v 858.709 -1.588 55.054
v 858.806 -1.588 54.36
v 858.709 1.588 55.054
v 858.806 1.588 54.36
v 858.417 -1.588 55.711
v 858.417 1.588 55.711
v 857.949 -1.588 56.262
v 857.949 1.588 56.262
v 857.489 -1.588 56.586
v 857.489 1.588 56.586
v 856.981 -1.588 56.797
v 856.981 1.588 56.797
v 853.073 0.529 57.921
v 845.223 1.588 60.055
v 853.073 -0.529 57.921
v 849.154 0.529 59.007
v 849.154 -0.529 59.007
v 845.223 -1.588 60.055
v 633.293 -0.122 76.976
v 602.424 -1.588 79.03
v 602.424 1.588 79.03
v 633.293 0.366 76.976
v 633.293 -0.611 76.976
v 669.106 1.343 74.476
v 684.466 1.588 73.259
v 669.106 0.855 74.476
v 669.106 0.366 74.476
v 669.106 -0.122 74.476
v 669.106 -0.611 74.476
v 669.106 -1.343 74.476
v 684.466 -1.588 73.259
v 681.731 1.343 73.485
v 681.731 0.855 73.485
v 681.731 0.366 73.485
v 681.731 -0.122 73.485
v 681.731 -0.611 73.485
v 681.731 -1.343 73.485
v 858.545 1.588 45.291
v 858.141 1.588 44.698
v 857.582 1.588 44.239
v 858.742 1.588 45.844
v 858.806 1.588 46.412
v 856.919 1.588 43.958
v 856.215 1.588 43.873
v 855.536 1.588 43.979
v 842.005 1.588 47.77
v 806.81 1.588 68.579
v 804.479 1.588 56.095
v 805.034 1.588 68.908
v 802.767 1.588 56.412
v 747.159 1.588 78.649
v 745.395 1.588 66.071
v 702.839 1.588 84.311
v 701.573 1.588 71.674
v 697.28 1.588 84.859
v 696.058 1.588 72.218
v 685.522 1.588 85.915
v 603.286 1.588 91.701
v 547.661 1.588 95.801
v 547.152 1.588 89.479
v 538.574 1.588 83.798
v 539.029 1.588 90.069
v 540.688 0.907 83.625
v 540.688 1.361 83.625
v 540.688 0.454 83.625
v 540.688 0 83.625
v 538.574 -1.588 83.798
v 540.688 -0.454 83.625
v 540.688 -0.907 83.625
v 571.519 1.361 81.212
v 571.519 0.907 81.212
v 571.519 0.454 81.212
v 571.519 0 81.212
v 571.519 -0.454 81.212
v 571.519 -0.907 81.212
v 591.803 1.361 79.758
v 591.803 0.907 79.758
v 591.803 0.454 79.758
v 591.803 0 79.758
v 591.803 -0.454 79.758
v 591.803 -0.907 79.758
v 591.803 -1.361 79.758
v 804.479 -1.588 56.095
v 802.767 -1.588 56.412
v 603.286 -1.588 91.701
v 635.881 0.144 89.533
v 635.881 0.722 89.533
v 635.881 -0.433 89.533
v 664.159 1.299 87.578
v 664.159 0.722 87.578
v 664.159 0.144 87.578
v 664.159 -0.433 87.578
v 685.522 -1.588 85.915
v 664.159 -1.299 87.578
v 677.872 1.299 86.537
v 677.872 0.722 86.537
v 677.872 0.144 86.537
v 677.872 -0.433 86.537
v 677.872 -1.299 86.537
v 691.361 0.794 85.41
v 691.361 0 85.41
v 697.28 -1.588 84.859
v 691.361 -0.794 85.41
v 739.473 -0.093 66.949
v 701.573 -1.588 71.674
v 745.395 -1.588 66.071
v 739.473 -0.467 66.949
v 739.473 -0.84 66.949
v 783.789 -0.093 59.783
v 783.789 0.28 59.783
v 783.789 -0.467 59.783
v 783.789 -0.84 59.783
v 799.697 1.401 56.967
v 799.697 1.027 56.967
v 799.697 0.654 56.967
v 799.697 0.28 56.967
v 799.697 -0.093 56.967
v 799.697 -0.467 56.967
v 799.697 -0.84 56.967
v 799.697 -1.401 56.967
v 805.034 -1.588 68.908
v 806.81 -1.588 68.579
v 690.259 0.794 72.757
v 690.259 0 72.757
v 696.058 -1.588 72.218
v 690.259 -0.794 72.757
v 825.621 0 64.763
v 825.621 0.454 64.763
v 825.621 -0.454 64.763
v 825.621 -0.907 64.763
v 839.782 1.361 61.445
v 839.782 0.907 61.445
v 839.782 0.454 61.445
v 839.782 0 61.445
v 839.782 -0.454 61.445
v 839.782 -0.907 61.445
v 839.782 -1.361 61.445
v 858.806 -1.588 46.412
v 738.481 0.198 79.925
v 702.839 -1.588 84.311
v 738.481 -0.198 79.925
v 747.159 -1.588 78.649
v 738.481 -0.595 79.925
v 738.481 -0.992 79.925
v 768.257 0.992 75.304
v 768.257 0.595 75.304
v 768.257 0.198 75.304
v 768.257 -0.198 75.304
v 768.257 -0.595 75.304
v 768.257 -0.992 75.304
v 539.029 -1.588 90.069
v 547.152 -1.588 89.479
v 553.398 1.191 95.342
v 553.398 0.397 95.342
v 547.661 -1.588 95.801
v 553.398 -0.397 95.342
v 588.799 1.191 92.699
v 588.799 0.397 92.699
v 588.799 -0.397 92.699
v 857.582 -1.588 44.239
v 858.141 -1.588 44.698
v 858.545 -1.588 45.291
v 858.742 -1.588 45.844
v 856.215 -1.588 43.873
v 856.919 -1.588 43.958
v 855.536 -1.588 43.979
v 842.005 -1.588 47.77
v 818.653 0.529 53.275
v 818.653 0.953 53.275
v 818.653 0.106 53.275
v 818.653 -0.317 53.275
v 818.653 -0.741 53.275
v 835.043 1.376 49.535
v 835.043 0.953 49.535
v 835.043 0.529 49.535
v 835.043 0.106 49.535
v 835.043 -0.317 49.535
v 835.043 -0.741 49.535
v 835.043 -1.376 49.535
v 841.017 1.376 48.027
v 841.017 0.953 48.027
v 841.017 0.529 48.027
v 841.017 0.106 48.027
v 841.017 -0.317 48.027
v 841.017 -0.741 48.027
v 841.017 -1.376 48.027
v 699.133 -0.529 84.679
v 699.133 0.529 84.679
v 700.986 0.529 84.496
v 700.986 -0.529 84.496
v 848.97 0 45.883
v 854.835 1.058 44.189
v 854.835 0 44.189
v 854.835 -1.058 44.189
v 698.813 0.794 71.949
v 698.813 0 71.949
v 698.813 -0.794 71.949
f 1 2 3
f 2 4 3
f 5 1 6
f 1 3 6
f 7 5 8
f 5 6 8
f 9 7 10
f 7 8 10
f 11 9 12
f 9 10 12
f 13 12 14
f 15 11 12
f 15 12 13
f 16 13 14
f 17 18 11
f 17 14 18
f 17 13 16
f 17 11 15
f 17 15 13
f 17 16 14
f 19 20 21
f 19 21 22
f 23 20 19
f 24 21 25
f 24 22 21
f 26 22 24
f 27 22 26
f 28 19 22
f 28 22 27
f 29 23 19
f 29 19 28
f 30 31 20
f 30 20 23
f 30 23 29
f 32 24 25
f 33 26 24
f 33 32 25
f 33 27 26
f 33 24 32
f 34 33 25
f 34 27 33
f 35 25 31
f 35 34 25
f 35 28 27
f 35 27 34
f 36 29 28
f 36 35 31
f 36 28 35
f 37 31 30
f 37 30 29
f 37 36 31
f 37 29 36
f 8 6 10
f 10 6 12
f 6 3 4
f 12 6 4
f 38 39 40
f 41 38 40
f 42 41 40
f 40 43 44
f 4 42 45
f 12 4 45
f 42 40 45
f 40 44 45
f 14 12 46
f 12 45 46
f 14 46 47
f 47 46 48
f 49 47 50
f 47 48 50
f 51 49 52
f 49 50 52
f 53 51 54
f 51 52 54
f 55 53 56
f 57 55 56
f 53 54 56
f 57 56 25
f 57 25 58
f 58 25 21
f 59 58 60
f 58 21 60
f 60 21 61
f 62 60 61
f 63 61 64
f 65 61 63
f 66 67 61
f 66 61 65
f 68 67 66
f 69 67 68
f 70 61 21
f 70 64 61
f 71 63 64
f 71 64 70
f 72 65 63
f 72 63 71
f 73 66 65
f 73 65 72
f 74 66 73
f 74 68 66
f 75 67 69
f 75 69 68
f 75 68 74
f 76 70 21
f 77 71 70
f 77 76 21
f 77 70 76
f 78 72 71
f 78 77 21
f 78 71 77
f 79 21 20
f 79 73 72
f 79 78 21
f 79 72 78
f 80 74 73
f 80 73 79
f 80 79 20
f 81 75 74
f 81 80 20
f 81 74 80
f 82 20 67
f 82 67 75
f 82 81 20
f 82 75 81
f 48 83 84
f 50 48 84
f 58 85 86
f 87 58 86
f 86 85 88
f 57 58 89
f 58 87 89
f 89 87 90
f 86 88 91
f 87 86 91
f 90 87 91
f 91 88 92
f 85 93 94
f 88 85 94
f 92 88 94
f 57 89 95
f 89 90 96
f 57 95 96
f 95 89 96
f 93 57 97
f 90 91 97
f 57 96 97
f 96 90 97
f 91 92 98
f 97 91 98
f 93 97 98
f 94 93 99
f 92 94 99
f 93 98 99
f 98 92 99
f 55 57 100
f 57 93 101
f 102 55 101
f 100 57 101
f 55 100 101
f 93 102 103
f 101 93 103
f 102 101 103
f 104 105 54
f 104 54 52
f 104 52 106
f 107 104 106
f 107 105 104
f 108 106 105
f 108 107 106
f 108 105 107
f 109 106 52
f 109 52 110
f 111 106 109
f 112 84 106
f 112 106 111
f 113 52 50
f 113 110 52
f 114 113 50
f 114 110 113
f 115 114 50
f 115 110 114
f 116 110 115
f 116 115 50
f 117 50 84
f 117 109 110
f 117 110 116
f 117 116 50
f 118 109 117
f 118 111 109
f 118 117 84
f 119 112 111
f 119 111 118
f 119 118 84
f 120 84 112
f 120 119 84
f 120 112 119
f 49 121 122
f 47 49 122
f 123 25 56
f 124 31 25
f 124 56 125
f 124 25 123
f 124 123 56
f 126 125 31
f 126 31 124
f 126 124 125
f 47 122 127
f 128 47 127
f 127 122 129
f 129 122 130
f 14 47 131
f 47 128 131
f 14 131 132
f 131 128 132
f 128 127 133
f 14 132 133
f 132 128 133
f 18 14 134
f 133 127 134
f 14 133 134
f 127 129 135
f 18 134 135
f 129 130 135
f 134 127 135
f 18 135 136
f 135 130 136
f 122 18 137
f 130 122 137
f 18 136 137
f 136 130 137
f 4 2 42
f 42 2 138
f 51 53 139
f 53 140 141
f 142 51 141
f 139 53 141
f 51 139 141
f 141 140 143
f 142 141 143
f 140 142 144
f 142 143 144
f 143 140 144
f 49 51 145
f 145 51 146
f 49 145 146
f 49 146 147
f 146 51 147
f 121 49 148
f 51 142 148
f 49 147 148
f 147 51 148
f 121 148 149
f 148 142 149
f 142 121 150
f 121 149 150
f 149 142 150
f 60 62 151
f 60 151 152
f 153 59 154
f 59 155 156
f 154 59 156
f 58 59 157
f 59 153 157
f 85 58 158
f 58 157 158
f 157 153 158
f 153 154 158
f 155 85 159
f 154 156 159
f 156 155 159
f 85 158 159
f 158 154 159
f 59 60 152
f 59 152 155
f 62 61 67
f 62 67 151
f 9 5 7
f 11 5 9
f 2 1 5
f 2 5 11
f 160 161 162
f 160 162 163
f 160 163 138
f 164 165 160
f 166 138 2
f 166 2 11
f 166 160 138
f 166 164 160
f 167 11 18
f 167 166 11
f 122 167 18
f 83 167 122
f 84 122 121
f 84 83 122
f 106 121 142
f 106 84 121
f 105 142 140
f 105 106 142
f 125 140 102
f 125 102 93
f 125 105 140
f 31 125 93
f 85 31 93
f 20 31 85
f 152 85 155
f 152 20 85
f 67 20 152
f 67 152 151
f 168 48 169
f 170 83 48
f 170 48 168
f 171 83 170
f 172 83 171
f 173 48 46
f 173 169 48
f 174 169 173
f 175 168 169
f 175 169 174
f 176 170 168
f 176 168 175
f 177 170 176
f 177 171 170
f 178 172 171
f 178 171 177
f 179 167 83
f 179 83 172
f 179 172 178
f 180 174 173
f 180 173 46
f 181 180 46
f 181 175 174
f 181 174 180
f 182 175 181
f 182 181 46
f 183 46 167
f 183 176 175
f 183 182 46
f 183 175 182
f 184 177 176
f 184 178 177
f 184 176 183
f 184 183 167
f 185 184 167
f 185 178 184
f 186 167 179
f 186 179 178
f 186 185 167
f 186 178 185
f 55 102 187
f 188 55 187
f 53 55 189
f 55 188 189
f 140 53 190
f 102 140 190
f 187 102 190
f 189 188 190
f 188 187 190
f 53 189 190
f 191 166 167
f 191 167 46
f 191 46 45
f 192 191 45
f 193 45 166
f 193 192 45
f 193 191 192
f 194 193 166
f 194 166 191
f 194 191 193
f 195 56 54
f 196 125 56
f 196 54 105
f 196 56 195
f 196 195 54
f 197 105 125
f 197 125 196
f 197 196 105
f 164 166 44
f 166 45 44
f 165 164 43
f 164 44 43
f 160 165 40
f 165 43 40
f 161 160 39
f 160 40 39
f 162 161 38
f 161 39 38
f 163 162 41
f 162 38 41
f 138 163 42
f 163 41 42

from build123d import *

# Parameters (mm, degrees)
BOSS_EXTRUDE1_START = -1.5875
BOSS_EXTRUDE1_DEPTH = 3.175
FILLET1_R           = 2.54
CUT_EXTRUDE1_DEPTH  = 7.62


# Read off the part's stored shape, not the designer's step: Boss-Extrude1
with BuildPart() as part:
    # Boss-Extrude1 outline → Boss-Extrude1 (new body)
    with BuildSketch(Plane(origin=(0, 0, 0), x_dir=(1, 0, 0), z_dir=(0, 1, 0)).offset(BOSS_EXTRUDE1_START)):
        with BuildLine():
            add(Edge.make_bspline(
                [(701.573370465, -71.674259434), (702.04697488, -71.626796619), (702.961854911, -71.534187022), (704.527211696, -71.372087014), (706.256268563, -71.189411511), (708.433468196, -70.954566837), (711.038260137, -70.66442021), (715.259153852, -70.176918919), (720.517449562, -69.537326192), (728.939784684, -68.449094171), (739.471043309, -66.973596397), (752.121699379, -65.058370184), (764.774270693, -63.022725712), (775.332382372, -61.245644149), (783.768221701, -59.789793136), (790.217423582, -58.659365862), (795.556531692, -57.710632329), (799.706029598, -56.965839367), (801.743713725, -56.597532565), (802.76701547, -56.411910209)],
                knots=[1.1996e-05, 1.1996e-05, 1.1996e-05, 1.1996e-05, 0.015636808, 0.031261621, 0.046886433, 0.062511246, 0.093760871, 0.125010496, 0.187509746, 0.250008997, 0.375007497, 0.500005998, 0.625004498, 0.750002999, 0.812502249, 0.875001499, 0.93750075, 0.968750375, 1, 1, 1, 1], degree=3))
            add(Edge.make_bspline(
                [(696.057912544, -72.218303811), (696.516819195, -72.173843609), (697.434189716, -72.08448281), (698.812500771, -71.948951554), (700.191895387, -71.812223809), (701.113019016, -71.720314305), (701.573370465, -71.674259434)],
                knots=[0.000436824, 0.000436824, 0.000436824, 0.000436824, 0.250279009, 0.500121194, 0.749963378, 0.999805563, 0.999805563, 0.999805563, 0.999805563], degree=3))
            add(Edge.make_bspline(
                [(684.465771861, -73.258588893), (685.427037387, -73.178353817), (687.338409796, -73.01607439), (690.270265001, -72.757917882), (693.135698373, -72.496722872), (695.087462196, -72.311946881), (696.057912544, -72.218303811)],
                knots=[-3.996e-06, -3.996e-06, -3.996e-06, -3.996e-06, 0.249945754, 0.499895504, 0.749845254, 0.999795004, 0.999795004, 0.999795004, 0.999795004], degree=3))
            add(Edge.make_bspline(
                [(602.42420841, -79.030202072), (604.074214061, -78.917973041), (607.327656264, -78.697993222), (612.488020924, -78.352754528), (617.82142797, -77.998720132), (624.748165187, -77.541006681), (633.288768179, -76.978079707), (643.562499486, -76.293021789), (653.811394813, -75.590339748), (662.341271598, -74.981221252), (669.157253218, -74.473896148), (673.963588211, -74.106706625), (678.141033863, -73.776630779), (681.719672317, -73.486306526), (683.554235836, -73.334679882), (684.465771861, -73.258588893)],
                knots=[4.679e-06, 4.679e-06, 4.679e-06, 4.679e-06, 0.062504419, 0.125004159, 0.1875039, 0.25000364, 0.375003121, 0.500002601, 0.625002082, 0.750001563, 0.812501303, 0.875001043, 0.937500783, 0.968750654, 1.000000524, 1.000000524, 1.000000524, 1.000000524], degree=3))
            add(Edge.make_bspline(
                [(520.17866376, -85.310815783), (520.948622537, -85.247475703), (522.472990474, -85.121954498), (525.646023872, -84.860432492), (529.954540392, -84.505420462), (535.485636827, -84.050761487), (540.7029418, -83.623505808), (545.828810606, -83.207047886), (550.972711882, -82.793890253), (556.116782859, -82.386921041), (562.976897794, -81.853433898), (571.571389273, -81.203899916), (581.568137842, -80.474939815), (590.024015055, -79.880194977), (597.052441707, -79.396103056), (600.639671821, -79.151478022), (602.42420841, -79.030202072)],
                knots=[1.3823e-05, 1.3823e-05, 1.3823e-05, 1.3823e-05, 0.031263258, 0.062512694, 0.125011564, 0.187510435, 0.250009305, 0.312508176, 0.375007046, 0.437505917, 0.500004787, 0.625002528, 0.750000269, 0.87499801, 0.937496881, 0.999995751, 0.999995751, 0.999995751, 0.999995751], degree=3))
            add(Edge.make_bspline(
                [(421.564796931, -90.347249187), (422.61109619, -90.324190198), (424.721066812, -90.275643156), (427.781390104, -90.199626606), (430.822063258, -90.118782847), (434.941029322, -90.002532976), (440.08484045, -89.844168641), (452.427619866, -89.421521336), (466.822115937, -88.804267378), (483.25535308, -87.910089241), (493.52068453, -87.276342604), (501.726177762, -86.718361924), (507.872215251, -86.275368153), (512.780927318, -85.902800926), (516.950869137, -85.573515025), (519.108912611, -85.398645627), (520.17866376, -85.310815783)],
                knots=[7.203e-06, 7.203e-06, 7.203e-06, 7.203e-06, 0.031256675, 0.062506146, 0.093755618, 0.125005089, 0.187504032, 0.250002975, 0.499998747, 0.624996633, 0.749994519, 0.812493462, 0.874992405, 0.937491348, 0.968740819, 0.999990291, 0.999990291, 0.999990291, 0.999990291], degree=3))
            add(Edge.make_bspline(
                [(346.714675087, -91.169822314), (347.184634959, -91.179549272), (348.149283989, -91.198362445), (349.881001429, -91.228640124), (351.370820969, -91.250109563), (353.638345707, -91.276445536), (356.741777131, -91.30289862), (360.603346067, -91.318288447), (365.253131479, -91.312388009), (369.910166762, -91.284169995), (376.135587827, -91.222367993), (383.937832745, -91.109503558), (391.757720532, -90.96544109), (398.23665113, -90.836219907), (403.230594411, -90.734014325), (408.182903858, -90.630969164), (412.914025095, -90.531986169), (416.611599734, -90.454119205), (419.474951766, -90.392792196), (420.864689854, -90.36259776), (421.564796931, -90.347249187)],
                knots=[1.1e-08, 1.1e-08, 1.1e-08, 1.1e-08, 0.015624829, 0.031249657, 0.062499315, 0.093748972, 0.12499863, 0.187497945, 0.24999726, 0.312496575, 0.37499589, 0.49999452, 0.62499315, 0.687492464, 0.749991779, 0.812491094, 0.874990409, 0.937489724, 0.968739382, 0.999989039, 0.999989039, 0.999989039, 0.999989039], degree=3))
            add(Edge.make_bspline(
                [(284.660180705, -86.02436228), (285.273667186, -86.114656759), (286.466569449, -86.288293963), (288.463107874, -86.571590524), (290.46491743, -86.848444068), (293.02699573, -87.19252046), (296.252166304, -87.606710304), (301.400962421, -88.226261718), (307.844767088, -88.921476193), (315.590478493, -89.626291032), (322.05207179, -90.106744711), (327.225920355, -90.425587153), (330.470644664, -90.599377294), (333.059733967, -90.723413499), (335.02192621, -90.809363102), (336.835778016, -90.883623075), (338.1694462, -90.935956115), (339.489700776, -90.98142965), (341.397886756, -91.039617592), (343.443225624, -91.094945655), (345.255837503, -91.138480537), (346.23440638, -91.159881953), (346.714675087, -91.169822314)],
                knots=[0, 0, 0, 0, 0.03125, 0.0625, 0.09375, 0.125, 0.1875, 0.25, 0.375, 0.5, 0.625, 0.6875, 0.75, 0.78125, 0.8125, 0.84375, 0.875, 0.90625, 0.9375, 0.96875, 0.984375, 1, 1, 1, 1], degree=3))
            add(Edge.make_bspline(
                [(258.083552795, -81.475395447), (258.347968296, -81.526862936), (258.876883054, -81.629439687), (259.670508063, -81.782232521), (260.729004783, -81.984533344), (265.19336261, -82.828339408), (273.252215122, -84.264018509), (280.795301047, -85.455519597), (284.660180705, -86.02436228)],
                knots=[0.425011658, 0.425011658, 0.425011658, 0.425011658, 0.442241189, 0.459470721, 0.476700252, 0.511159315, 0.75, 1, 1, 1, 1], degree=3))
            Line((258.083552795, -81.475395447), (258.083552795, -94.40861288))
            add(Edge.make_bspline(
                [(282.810885884, -98.588999508), (274.906267762, -97.425577983), (267.032082315, -96.096692803), (258.818160589, -94.548151889), (258.450825612, -94.478551371), (258.083552795, -94.40861288)],
                knots=[0, 0, 0, 0, 0.5, 0.5, 0.523411439, 0.523411439, 0.523411439, 0.523411439], degree=3))
            add(Edge.make_bspline(
                [(282.810885884, -98.588999508), (283.589001764, -98.703524555), (285.164508504, -98.932181064), (287.829592849, -99.306686744), (290.382113422, -99.652796041), (292.96654593, -99.989964246), (295.582618612, -100.317621114), (298.230083081, -100.634886778), (300.908649594, -100.941019762), (303.61800528, -101.235303734), (306.357810596, -101.517085869), (309.127700691, -101.785780175), (311.92729165, -102.040857239), (316.290106771, -102.412643883), (322.527800913, -102.877083333), (328.625603501, -103.227822262), (333.380129051, -103.452212237), (336.816790701, -103.594408746), (339.260438836, -103.686034081), (343.688375923, -103.809905452), (346.451873128, -103.867102934)],
                knots=[0, 0, 0, 0, 0.039344948, 0.07917436, 0.119484401, 0.160271019, 0.201529957, 0.243256752, 0.285446746, 0.328095093, 0.37119677, 0.414746584, 0.458739194, 0.503169123, 0.620303495, 0.752369719, 0.789892337, 0.843756099, 0.913843268, 1, 1, 1, 1], degree=3))
            add(Edge.make_bspline(
                [(346.451873128, -103.867102934), (347.517721695, -103.889163254), (349.542313965, -103.92559437), (351.410670783, -103.951601003), (353.733077388, -103.97802022), (356.595805361, -104.001616052), (359.303450326, -104.013254143), (361.856652408, -104.015647305), (363.59855953, -104.013876583), (367.980988834, -104.00146953), (374.772600805, -103.943346872), (385.553908564, -103.787153573), (397.279033824, -103.561287268), (410.957604412, -103.27591363), (418.412993695, -103.119398813), (421.843885938, -103.044182276)],
                knots=[0, 0, 0, 0, 0.033933195, 0.066295354, 0.097094988, 0.12634023, 0.180197875, 0.204824218, 0.227923989, 0.249502809, 0.379187752, 0.498147003, 0.678500622, 0.845778388, 1, 1, 1, 1], degree=3))
            add(Edge.make_bspline(
                [(421.843885938, -103.044182276), (423.284501257, -103.01243375), (426.138074601, -102.945774905), (430.23392379, -102.840101392), (434.371968877, -102.72425222), (439.798819101, -102.559925422), (448.025157593, -102.283759658), (459.021003941, -101.848637215), (471.45249354, -101.271082202), (483.913686147, -100.593406887), (494.231772367, -99.956980278), (502.466387344, -99.39745886), (508.578998405, -98.957752379), (514.573610191, -98.503827918), (518.958126171, -98.153760061), (521.218891036, -97.968142841)],
                knots=[0, 0, 0, 0, 0.042442699, 0.084473439, 0.126075796, 0.167232557, 0.248140272, 0.374197286, 0.498957981, 0.623287397, 0.750390596, 0.810583593, 0.872090979, 0.935130561, 1, 1, 1, 1], degree=3))
            add(Edge.make_bspline(
                [(521.218891036, -97.968142841), (523.451350188, -97.784491424), (528.137879673, -97.397889698), (536.731309482, -96.690817555), (544.954460679, -96.018267543), (553.50407331, -95.33057133), (563.716480518, -94.531063336), (575.636513939, -93.635190253), (588.786212869, -92.692538058), (598.347131864, -92.036570917), (603.285671904, -91.700951094)],
                knots=[0, 0, 0, 0, 0.091538543, 0.187736577, 0.288050862, 0.392265043, 0.500367872, 0.66142166, 0.827962884, 1, 1, 1, 1], degree=3))
            add(Edge.make_bspline(
                [(603.285671904, -91.700951094), (605.78808228, -91.530743591), (610.897032353, -91.186403467), (619.306599861, -90.627823918), (627.538601032, -90.084789882), (635.936476676, -89.530098998), (643.719546666, -89.009847824), (650.893783861, -88.520535985), (657.46530725, -88.061941255), (664.220349455, -87.576914876), (671.158631923, -87.060362733), (677.768426526, -86.549575155), (682.892578542, -86.13408317), (685.522190682, -85.9145748)],
                knots=[0, 0, 0, 0, 0.096041268, 0.194096291, 0.29416615, 0.396252661, 0.500358628, 0.578021943, 0.657927659, 0.740076076, 0.824468696, 0.911108458, 1, 1, 1, 1], degree=3))
            add(Edge.make_bspline(
                [(685.522190682, -85.9145748), (686.483363358, -85.834347474), (688.416317483, -85.670266195), (691.375399642, -85.409794673), (694.295027309, -85.143745348), (696.281480154, -84.95572275), (697.280162315, -84.859352478)],
                knots=[0, 0, 0, 0, 0.247890437, 0.497182912, 0.747883707, 1, 1, 1, 1], degree=3))
            add(Edge.make_bspline(
                [(697.280162315, -84.859352478), (699.133498258, -84.679799353), (700.986276607, -84.496390936), (702.838684367, -84.311070025)],
                knots=[0, 0, 0, 0, 1, 1, 1, 1], degree=3))
            add(Edge.make_bspline(
                [(702.838684367, -84.311070025), (703.589775295, -84.235799752), (705.133492987, -84.078629058), (708.047466313, -83.771407142), (710.748991263, -83.476233306), (713.523455705, -83.162791229), (716.37085234, -82.830812164), (719.291149506, -82.479719712), (722.284334057, -82.109050619), (725.350396028, -81.718303946), (730.760173437, -81.009658613), (740.331799838, -79.683632118), (753.598097399, -77.68903736), (767.27468421, -75.481732644), (778.677358422, -73.559116698), (788.170711893, -71.915943965), (796.891357387, -70.375844053), (802.366731643, -69.391771369), (805.033747795, -68.907986576)],
                knots=[0, 0, 0, 0, 0.024848372, 0.050416521, 0.076704883, 0.103713975, 0.131444397, 0.159896834, 0.189072062, 0.218970945, 0.249594443, 0.347406526, 0.499390399, 0.638902952, 0.749436379, 0.834969029, 0.918499168, 1, 1, 1, 1], degree=3))
            Line((805.033747795, -68.907986576), (806.809551789, -68.578936168))
            add(Edge.make_bspline(
                [(806.809551789, -68.578936168), (807.794004822, -68.395119755), (809.726191369, -68.029713589), (811.766757719, -67.634799792), (814.185248792, -67.158567155), (816.55886725, -66.68111941), (820.369254046, -65.898841142), (824.807312319, -64.951185469), (829.827239229, -63.826217582), (833.268092373, -63.026324522), (835.935211118, -62.389425037), (837.873162846, -61.91853539), (839.769381429, -61.449895816), (841.624127129, -60.983575945), (843.734931971, -60.443149682), (844.733875611, -60.183258894), (845.223156672, -60.055102096)],
                knots=[0, 0, 0, 0, 0.064848776, 0.128591831, 0.191223632, 0.252742215, 0.313148507, 0.487734154, 0.598660779, 0.705288655, 0.75701083, 0.807682273, 0.85731034, 0.905901891, 0.953463218, 1, 1, 1, 1], degree=3))
            add(Edge.make_bspline(
                [(858.805970467, -56.257210913), (854.302265416, -57.602424975), (849.773135735, -58.863331563), (845.223156672, -60.055102096)],
                knots=[0.525572557, 0.525572557, 0.525572557, 0.525572557, 1, 1, 1, 1], degree=3))
            Line((858.805970467, -56.257210913), (858.805970467, -42.981654463))
            add(Edge.make_bspline(
                [(842.005216089, -47.769547229), (844.33209519, -47.160070589), (848.630876213, -45.996859499), (853.420502494, -44.614540459), (856.161610787, -43.791878163), (857.220661541, -43.470009626), (858.013965236, -43.226852548), (858.542087125, -43.063586295), (858.805970467, -42.981654463)],
                knots=[0, 0, 0, 0, 0.25, 0.462204418, 0.52007177, 0.549005446, 0.577939123, 0.606872799, 0.606872799, 0.606872799, 0.606872799], degree=3))
            add(Edge.make_bspline(
                [(804.478503109, -56.094697623), (804.937261418, -56.009038578), (805.873535899, -55.833158182), (807.593890186, -55.506511486), (809.223478159, -55.191529302), (811.577863033, -54.728351346), (814.728198308, -54.095426794), (818.65467417, -53.281335813), (823.355137668, -52.264852214), (828.043123472, -51.207419322), (831.9339187, -50.292144023), (835.047083584, -49.53591133), (836.970069876, -49.058975401), (838.551971708, -48.659746263), (839.885294081, -48.319263071), (841.0585054, -48.016793361), (841.676038434, -47.855768334), (842.005216089, -47.769547229)],
                knots=[0, 0, 0, 0, 0.03125, 0.0625, 0.125, 0.1875, 0.25, 0.375, 0.5, 0.625, 0.75, 0.8125, 0.875, 0.90625, 0.9375, 0.96875, 1, 1, 1, 1], degree=3))
            Line((804.478503109, -56.094697623), (802.76701547, -56.411910209))
        make_face()
    extrude(amount=BOSS_EXTRUDE1_DEPTH)

    # Fillet1
    fillet1_edges = [part.edges().sort_by_distance(p)[0] for p in [
        (858.805970467, 0, 42.981654463),
        (858.805970467, 0, 56.257210913),
        (258.083552795, 0, 81.475395447),
        (258.083552795, 0, 94.40861288),
    ]]
    fillet(fillet1_edges, radius=FILLET1_R)

    # Sketch3 → Cut-Extrude1 (cut)
    with BuildSketch(Plane(origin=(0, 1.5875, 0), x_dir=(1, 0, 0), z_dir=(0, 1, 0))):
        with BuildLine():
            Line((538.573908081, -83.797990994), (539.029351184, -90.069007907))
            Line((539.029351184, -90.069007907), (547.151700891, -89.47910866))
            Line((547.151700891, -89.47910866), (547.661463933, -95.801226886))
            add(Edge.make_bspline(
                [(521.218891036, -97.968142841), (523.451350188, -97.784491424), (528.137879673, -97.397889698), (536.731309482, -96.690817555), (543.042562143, -96.17463672), (546.723612796, -95.876847403), (547.661463933, -95.801226886)],
                knots=[0, 0, 0, 0, 0.091538543, 0.187736577, 0.288050862, 0.322345551, 0.322345551, 0.322345551, 0.322345551], degree=3))
            add(Edge.make_bspline(
                [(421.843885938, -103.044182276), (423.284501257, -103.01243375), (426.138074601, -102.945774905), (430.23392379, -102.840101392), (434.371968877, -102.72425222), (439.798819101, -102.559925422), (448.025157593, -102.283759658), (459.021003941, -101.848637215), (471.45249354, -101.271082202), (483.913686147, -100.593406887), (494.231772367, -99.956980278), (502.466387344, -99.39745886), (508.578998405, -98.957752379), (514.573610191, -98.503827918), (518.958126171, -98.153760061), (521.218891036, -97.968142841)],
                knots=[0, 0, 0, 0, 0.042442699, 0.084473439, 0.126075796, 0.167232557, 0.248140272, 0.374197286, 0.498957981, 0.623287397, 0.750390596, 0.810583593, 0.872090979, 0.935130561, 1, 1, 1, 1], degree=3))
            add(Edge.make_bspline(
                [(346.451873128, -103.867102934), (347.517721695, -103.889163254), (349.542313965, -103.92559437), (351.410670783, -103.951601003), (353.733077388, -103.97802022), (356.595805361, -104.001616052), (359.303450326, -104.013254143), (361.856652408, -104.015647305), (363.59855953, -104.013876583), (367.980988834, -104.00146953), (374.772600805, -103.943346872), (385.553908564, -103.787153573), (397.279033824, -103.561287268), (410.957604412, -103.27591363), (418.412993695, -103.119398813), (421.843885938, -103.044182276)],
                knots=[0, 0, 0, 0, 0.033933195, 0.066295354, 0.097094988, 0.12634023, 0.180197875, 0.204824218, 0.227923989, 0.249502809, 0.379187752, 0.498147003, 0.678500622, 0.845778388, 1, 1, 1, 1], degree=3))
            add(Edge.make_bspline(
                [(282.810885884, -98.588999508), (283.589001764, -98.703524555), (285.164508504, -98.932181064), (287.829592849, -99.306686744), (290.382113422, -99.652796041), (292.96654593, -99.989964246), (295.582618612, -100.317621114), (298.230083081, -100.634886778), (300.908649594, -100.941019762), (303.61800528, -101.235303734), (306.357810596, -101.517085869), (309.127700691, -101.785780175), (311.92729165, -102.040857239), (316.290106771, -102.412643883), (322.527800913, -102.877083333), (328.625603501, -103.227822262), (333.380129051, -103.452212237), (336.816790701, -103.594408746), (339.260438836, -103.686034081), (343.688375923, -103.809905452), (346.451873128, -103.867102934)],
                knots=[0, 0, 0, 0, 0.039344948, 0.07917436, 0.119484401, 0.160271019, 0.201529957, 0.243256752, 0.285446746, 0.328095093, 0.37119677, 0.414746584, 0.458739194, 0.503169123, 0.620303495, 0.752369719, 0.789892337, 0.843756099, 0.913843268, 1, 1, 1, 1], degree=3))
            add(Edge.make_bspline(
                [(260.156933678, -94.799777019), (267.681906669, -96.206087709), (275.23240977, -97.473589286), (282.810885884, -98.588999508)],
                knots=[0, 0, 0, 0, 0.479370069, 0.479370069, 0.479370069, 0.479370069], degree=3))
            ThreePointArc((260.156933678, -94.799777019), (258.66947298, -93.925704756), (258.083552795, -92.302978906))
            Line((258.083552795, -92.302978906), (258.083552795, -84.549365422))
            ThreePointArc((258.083552795, -84.549365422), (259.00311997, -82.593400837), (261.09599174, -82.053688872))
            add(Edge.make_bspline(
                [(284.660180705, -86.02436228), (280.795301047, -85.455519597), (273.252215122, -84.264018509), (265.404390098, -82.865933811), (261.414911279, -82.114061283), (261.09599174, -82.053688872)],
                knots=[0.490403274, 0.490403274, 0.490403274, 0.490403274, 0.740403274, 0.979243959, 1, 1, 1, 1], degree=3))
            add(Edge.make_bspline(
                [(346.714674129, -91.169822295), (346.23440638, -91.159881953), (345.255837503, -91.138480537), (343.443225624, -91.094945655), (341.397886756, -91.039617592), (339.489700776, -90.98142965), (338.1694462, -90.935956115), (336.835778016, -90.883623075), (335.02192621, -90.809363102), (333.059733967, -90.723413499), (330.470644664, -90.599377294), (327.225920355, -90.425587153), (322.05207179, -90.106744711), (315.590478493, -89.626291032), (307.844767088, -88.921476193), (301.400962421, -88.226261718), (296.252166304, -87.606710304), (293.02699573, -87.19252046), (290.46491743, -86.848444068), (288.463107874, -86.571590524), (286.466569449, -86.288293963), (285.273667186, -86.114656759), (284.660180705, -86.02436228)],
                knots=[2.1e-08, 2.1e-08, 2.1e-08, 2.1e-08, 0.015625, 0.03125, 0.0625, 0.09375, 0.125, 0.15625, 0.1875, 0.21875, 0.25, 0.3125, 0.375, 0.5, 0.625, 0.75, 0.8125, 0.875, 0.90625, 0.9375, 0.96875, 1, 1, 1, 1], degree=3))
            add(Edge.make_bspline(
                [(421.564796931, -90.347249187), (420.864689854, -90.36259776), (419.474951766, -90.392792196), (416.611599734, -90.454119205), (412.914025095, -90.531986169), (408.182903858, -90.630969164), (403.230594411, -90.734014325), (398.23665113, -90.836219907), (391.757720532, -90.96544109), (383.937832745, -91.109503558), (376.135587827, -91.222367993), (369.910166762, -91.284169995), (365.253131479, -91.312388009), (360.603346067, -91.318288447), (356.741777131, -91.30289862), (353.638345707, -91.276445536), (351.370820969, -91.250109563), (349.881001429, -91.228640124), (348.149283695, -91.19836244), (347.184634303, -91.17954926), (346.714674129, -91.169822295)],
                knots=[0, 0, 0, 0, 0.031249657, 0.062499315, 0.12499863, 0.187497945, 0.24999726, 0.312496575, 0.37499589, 0.49999452, 0.62499315, 0.687492464, 0.749991779, 0.812491094, 0.874990409, 0.906240067, 0.937489724, 0.968739382, 0.984364211, 0.999989039, 0.999989039, 0.999989039, 0.999989039], degree=3))
            add(Edge.make_bspline(
                [(520.17866376, -85.310815783), (519.108912611, -85.398645627), (516.950869137, -85.573515025), (512.780927318, -85.902800926), (507.872215251, -86.275368153), (501.726177762, -86.718361924), (493.52068453, -87.276342604), (483.25535308, -87.910089241), (466.822115937, -88.804267378), (452.427619866, -89.421521336), (440.08484045, -89.844168641), (434.941029322, -90.002532976), (430.822063258, -90.118782847), (427.781390104, -90.199626606), (424.721066812, -90.275643156), (422.61109619, -90.324190198), (421.564796931, -90.347249187)],
                knots=[7.203e-06, 7.203e-06, 7.203e-06, 7.203e-06, 0.031256675, 0.062506146, 0.125005089, 0.187504032, 0.250002975, 0.375000861, 0.499998747, 0.749994519, 0.812493462, 0.874992405, 0.906241876, 0.937491348, 0.968740819, 0.999990291, 0.999990291, 0.999990291, 0.999990291], degree=3))
            add(Edge.make_bspline(
                [(538.573908081, -83.797990994), (537.540297953, -83.882548181), (534.735644037, -84.112411281), (529.954540392, -84.505420462), (525.646023872, -84.860432492), (522.472990474, -85.121954498), (520.948622537, -85.247475703), (520.17866376, -85.310815783)],
                knots=[0.775424, 0.775424, 0.775424, 0.775424, 0.81249914, 0.87499801, 0.937496881, 0.968746316, 0.999995751, 0.999995751, 0.999995751, 0.999995751], degree=3))
        make_face()
    extrude(amount=-CUT_EXTRUDE1_DEPTH, mode=Mode.SUBTRACT)


with BuildPart() as cut_extrude1_kept_piece:
    # of the separate pieces the step leaves, the one the design keeps (cut_extrude1_pieces_kept)
    add(part.part.solids().sort_by_distance((855.536472896, -1.5875, 43.979149832))[0])


solid = cut_extrude1_kept_piece.part
